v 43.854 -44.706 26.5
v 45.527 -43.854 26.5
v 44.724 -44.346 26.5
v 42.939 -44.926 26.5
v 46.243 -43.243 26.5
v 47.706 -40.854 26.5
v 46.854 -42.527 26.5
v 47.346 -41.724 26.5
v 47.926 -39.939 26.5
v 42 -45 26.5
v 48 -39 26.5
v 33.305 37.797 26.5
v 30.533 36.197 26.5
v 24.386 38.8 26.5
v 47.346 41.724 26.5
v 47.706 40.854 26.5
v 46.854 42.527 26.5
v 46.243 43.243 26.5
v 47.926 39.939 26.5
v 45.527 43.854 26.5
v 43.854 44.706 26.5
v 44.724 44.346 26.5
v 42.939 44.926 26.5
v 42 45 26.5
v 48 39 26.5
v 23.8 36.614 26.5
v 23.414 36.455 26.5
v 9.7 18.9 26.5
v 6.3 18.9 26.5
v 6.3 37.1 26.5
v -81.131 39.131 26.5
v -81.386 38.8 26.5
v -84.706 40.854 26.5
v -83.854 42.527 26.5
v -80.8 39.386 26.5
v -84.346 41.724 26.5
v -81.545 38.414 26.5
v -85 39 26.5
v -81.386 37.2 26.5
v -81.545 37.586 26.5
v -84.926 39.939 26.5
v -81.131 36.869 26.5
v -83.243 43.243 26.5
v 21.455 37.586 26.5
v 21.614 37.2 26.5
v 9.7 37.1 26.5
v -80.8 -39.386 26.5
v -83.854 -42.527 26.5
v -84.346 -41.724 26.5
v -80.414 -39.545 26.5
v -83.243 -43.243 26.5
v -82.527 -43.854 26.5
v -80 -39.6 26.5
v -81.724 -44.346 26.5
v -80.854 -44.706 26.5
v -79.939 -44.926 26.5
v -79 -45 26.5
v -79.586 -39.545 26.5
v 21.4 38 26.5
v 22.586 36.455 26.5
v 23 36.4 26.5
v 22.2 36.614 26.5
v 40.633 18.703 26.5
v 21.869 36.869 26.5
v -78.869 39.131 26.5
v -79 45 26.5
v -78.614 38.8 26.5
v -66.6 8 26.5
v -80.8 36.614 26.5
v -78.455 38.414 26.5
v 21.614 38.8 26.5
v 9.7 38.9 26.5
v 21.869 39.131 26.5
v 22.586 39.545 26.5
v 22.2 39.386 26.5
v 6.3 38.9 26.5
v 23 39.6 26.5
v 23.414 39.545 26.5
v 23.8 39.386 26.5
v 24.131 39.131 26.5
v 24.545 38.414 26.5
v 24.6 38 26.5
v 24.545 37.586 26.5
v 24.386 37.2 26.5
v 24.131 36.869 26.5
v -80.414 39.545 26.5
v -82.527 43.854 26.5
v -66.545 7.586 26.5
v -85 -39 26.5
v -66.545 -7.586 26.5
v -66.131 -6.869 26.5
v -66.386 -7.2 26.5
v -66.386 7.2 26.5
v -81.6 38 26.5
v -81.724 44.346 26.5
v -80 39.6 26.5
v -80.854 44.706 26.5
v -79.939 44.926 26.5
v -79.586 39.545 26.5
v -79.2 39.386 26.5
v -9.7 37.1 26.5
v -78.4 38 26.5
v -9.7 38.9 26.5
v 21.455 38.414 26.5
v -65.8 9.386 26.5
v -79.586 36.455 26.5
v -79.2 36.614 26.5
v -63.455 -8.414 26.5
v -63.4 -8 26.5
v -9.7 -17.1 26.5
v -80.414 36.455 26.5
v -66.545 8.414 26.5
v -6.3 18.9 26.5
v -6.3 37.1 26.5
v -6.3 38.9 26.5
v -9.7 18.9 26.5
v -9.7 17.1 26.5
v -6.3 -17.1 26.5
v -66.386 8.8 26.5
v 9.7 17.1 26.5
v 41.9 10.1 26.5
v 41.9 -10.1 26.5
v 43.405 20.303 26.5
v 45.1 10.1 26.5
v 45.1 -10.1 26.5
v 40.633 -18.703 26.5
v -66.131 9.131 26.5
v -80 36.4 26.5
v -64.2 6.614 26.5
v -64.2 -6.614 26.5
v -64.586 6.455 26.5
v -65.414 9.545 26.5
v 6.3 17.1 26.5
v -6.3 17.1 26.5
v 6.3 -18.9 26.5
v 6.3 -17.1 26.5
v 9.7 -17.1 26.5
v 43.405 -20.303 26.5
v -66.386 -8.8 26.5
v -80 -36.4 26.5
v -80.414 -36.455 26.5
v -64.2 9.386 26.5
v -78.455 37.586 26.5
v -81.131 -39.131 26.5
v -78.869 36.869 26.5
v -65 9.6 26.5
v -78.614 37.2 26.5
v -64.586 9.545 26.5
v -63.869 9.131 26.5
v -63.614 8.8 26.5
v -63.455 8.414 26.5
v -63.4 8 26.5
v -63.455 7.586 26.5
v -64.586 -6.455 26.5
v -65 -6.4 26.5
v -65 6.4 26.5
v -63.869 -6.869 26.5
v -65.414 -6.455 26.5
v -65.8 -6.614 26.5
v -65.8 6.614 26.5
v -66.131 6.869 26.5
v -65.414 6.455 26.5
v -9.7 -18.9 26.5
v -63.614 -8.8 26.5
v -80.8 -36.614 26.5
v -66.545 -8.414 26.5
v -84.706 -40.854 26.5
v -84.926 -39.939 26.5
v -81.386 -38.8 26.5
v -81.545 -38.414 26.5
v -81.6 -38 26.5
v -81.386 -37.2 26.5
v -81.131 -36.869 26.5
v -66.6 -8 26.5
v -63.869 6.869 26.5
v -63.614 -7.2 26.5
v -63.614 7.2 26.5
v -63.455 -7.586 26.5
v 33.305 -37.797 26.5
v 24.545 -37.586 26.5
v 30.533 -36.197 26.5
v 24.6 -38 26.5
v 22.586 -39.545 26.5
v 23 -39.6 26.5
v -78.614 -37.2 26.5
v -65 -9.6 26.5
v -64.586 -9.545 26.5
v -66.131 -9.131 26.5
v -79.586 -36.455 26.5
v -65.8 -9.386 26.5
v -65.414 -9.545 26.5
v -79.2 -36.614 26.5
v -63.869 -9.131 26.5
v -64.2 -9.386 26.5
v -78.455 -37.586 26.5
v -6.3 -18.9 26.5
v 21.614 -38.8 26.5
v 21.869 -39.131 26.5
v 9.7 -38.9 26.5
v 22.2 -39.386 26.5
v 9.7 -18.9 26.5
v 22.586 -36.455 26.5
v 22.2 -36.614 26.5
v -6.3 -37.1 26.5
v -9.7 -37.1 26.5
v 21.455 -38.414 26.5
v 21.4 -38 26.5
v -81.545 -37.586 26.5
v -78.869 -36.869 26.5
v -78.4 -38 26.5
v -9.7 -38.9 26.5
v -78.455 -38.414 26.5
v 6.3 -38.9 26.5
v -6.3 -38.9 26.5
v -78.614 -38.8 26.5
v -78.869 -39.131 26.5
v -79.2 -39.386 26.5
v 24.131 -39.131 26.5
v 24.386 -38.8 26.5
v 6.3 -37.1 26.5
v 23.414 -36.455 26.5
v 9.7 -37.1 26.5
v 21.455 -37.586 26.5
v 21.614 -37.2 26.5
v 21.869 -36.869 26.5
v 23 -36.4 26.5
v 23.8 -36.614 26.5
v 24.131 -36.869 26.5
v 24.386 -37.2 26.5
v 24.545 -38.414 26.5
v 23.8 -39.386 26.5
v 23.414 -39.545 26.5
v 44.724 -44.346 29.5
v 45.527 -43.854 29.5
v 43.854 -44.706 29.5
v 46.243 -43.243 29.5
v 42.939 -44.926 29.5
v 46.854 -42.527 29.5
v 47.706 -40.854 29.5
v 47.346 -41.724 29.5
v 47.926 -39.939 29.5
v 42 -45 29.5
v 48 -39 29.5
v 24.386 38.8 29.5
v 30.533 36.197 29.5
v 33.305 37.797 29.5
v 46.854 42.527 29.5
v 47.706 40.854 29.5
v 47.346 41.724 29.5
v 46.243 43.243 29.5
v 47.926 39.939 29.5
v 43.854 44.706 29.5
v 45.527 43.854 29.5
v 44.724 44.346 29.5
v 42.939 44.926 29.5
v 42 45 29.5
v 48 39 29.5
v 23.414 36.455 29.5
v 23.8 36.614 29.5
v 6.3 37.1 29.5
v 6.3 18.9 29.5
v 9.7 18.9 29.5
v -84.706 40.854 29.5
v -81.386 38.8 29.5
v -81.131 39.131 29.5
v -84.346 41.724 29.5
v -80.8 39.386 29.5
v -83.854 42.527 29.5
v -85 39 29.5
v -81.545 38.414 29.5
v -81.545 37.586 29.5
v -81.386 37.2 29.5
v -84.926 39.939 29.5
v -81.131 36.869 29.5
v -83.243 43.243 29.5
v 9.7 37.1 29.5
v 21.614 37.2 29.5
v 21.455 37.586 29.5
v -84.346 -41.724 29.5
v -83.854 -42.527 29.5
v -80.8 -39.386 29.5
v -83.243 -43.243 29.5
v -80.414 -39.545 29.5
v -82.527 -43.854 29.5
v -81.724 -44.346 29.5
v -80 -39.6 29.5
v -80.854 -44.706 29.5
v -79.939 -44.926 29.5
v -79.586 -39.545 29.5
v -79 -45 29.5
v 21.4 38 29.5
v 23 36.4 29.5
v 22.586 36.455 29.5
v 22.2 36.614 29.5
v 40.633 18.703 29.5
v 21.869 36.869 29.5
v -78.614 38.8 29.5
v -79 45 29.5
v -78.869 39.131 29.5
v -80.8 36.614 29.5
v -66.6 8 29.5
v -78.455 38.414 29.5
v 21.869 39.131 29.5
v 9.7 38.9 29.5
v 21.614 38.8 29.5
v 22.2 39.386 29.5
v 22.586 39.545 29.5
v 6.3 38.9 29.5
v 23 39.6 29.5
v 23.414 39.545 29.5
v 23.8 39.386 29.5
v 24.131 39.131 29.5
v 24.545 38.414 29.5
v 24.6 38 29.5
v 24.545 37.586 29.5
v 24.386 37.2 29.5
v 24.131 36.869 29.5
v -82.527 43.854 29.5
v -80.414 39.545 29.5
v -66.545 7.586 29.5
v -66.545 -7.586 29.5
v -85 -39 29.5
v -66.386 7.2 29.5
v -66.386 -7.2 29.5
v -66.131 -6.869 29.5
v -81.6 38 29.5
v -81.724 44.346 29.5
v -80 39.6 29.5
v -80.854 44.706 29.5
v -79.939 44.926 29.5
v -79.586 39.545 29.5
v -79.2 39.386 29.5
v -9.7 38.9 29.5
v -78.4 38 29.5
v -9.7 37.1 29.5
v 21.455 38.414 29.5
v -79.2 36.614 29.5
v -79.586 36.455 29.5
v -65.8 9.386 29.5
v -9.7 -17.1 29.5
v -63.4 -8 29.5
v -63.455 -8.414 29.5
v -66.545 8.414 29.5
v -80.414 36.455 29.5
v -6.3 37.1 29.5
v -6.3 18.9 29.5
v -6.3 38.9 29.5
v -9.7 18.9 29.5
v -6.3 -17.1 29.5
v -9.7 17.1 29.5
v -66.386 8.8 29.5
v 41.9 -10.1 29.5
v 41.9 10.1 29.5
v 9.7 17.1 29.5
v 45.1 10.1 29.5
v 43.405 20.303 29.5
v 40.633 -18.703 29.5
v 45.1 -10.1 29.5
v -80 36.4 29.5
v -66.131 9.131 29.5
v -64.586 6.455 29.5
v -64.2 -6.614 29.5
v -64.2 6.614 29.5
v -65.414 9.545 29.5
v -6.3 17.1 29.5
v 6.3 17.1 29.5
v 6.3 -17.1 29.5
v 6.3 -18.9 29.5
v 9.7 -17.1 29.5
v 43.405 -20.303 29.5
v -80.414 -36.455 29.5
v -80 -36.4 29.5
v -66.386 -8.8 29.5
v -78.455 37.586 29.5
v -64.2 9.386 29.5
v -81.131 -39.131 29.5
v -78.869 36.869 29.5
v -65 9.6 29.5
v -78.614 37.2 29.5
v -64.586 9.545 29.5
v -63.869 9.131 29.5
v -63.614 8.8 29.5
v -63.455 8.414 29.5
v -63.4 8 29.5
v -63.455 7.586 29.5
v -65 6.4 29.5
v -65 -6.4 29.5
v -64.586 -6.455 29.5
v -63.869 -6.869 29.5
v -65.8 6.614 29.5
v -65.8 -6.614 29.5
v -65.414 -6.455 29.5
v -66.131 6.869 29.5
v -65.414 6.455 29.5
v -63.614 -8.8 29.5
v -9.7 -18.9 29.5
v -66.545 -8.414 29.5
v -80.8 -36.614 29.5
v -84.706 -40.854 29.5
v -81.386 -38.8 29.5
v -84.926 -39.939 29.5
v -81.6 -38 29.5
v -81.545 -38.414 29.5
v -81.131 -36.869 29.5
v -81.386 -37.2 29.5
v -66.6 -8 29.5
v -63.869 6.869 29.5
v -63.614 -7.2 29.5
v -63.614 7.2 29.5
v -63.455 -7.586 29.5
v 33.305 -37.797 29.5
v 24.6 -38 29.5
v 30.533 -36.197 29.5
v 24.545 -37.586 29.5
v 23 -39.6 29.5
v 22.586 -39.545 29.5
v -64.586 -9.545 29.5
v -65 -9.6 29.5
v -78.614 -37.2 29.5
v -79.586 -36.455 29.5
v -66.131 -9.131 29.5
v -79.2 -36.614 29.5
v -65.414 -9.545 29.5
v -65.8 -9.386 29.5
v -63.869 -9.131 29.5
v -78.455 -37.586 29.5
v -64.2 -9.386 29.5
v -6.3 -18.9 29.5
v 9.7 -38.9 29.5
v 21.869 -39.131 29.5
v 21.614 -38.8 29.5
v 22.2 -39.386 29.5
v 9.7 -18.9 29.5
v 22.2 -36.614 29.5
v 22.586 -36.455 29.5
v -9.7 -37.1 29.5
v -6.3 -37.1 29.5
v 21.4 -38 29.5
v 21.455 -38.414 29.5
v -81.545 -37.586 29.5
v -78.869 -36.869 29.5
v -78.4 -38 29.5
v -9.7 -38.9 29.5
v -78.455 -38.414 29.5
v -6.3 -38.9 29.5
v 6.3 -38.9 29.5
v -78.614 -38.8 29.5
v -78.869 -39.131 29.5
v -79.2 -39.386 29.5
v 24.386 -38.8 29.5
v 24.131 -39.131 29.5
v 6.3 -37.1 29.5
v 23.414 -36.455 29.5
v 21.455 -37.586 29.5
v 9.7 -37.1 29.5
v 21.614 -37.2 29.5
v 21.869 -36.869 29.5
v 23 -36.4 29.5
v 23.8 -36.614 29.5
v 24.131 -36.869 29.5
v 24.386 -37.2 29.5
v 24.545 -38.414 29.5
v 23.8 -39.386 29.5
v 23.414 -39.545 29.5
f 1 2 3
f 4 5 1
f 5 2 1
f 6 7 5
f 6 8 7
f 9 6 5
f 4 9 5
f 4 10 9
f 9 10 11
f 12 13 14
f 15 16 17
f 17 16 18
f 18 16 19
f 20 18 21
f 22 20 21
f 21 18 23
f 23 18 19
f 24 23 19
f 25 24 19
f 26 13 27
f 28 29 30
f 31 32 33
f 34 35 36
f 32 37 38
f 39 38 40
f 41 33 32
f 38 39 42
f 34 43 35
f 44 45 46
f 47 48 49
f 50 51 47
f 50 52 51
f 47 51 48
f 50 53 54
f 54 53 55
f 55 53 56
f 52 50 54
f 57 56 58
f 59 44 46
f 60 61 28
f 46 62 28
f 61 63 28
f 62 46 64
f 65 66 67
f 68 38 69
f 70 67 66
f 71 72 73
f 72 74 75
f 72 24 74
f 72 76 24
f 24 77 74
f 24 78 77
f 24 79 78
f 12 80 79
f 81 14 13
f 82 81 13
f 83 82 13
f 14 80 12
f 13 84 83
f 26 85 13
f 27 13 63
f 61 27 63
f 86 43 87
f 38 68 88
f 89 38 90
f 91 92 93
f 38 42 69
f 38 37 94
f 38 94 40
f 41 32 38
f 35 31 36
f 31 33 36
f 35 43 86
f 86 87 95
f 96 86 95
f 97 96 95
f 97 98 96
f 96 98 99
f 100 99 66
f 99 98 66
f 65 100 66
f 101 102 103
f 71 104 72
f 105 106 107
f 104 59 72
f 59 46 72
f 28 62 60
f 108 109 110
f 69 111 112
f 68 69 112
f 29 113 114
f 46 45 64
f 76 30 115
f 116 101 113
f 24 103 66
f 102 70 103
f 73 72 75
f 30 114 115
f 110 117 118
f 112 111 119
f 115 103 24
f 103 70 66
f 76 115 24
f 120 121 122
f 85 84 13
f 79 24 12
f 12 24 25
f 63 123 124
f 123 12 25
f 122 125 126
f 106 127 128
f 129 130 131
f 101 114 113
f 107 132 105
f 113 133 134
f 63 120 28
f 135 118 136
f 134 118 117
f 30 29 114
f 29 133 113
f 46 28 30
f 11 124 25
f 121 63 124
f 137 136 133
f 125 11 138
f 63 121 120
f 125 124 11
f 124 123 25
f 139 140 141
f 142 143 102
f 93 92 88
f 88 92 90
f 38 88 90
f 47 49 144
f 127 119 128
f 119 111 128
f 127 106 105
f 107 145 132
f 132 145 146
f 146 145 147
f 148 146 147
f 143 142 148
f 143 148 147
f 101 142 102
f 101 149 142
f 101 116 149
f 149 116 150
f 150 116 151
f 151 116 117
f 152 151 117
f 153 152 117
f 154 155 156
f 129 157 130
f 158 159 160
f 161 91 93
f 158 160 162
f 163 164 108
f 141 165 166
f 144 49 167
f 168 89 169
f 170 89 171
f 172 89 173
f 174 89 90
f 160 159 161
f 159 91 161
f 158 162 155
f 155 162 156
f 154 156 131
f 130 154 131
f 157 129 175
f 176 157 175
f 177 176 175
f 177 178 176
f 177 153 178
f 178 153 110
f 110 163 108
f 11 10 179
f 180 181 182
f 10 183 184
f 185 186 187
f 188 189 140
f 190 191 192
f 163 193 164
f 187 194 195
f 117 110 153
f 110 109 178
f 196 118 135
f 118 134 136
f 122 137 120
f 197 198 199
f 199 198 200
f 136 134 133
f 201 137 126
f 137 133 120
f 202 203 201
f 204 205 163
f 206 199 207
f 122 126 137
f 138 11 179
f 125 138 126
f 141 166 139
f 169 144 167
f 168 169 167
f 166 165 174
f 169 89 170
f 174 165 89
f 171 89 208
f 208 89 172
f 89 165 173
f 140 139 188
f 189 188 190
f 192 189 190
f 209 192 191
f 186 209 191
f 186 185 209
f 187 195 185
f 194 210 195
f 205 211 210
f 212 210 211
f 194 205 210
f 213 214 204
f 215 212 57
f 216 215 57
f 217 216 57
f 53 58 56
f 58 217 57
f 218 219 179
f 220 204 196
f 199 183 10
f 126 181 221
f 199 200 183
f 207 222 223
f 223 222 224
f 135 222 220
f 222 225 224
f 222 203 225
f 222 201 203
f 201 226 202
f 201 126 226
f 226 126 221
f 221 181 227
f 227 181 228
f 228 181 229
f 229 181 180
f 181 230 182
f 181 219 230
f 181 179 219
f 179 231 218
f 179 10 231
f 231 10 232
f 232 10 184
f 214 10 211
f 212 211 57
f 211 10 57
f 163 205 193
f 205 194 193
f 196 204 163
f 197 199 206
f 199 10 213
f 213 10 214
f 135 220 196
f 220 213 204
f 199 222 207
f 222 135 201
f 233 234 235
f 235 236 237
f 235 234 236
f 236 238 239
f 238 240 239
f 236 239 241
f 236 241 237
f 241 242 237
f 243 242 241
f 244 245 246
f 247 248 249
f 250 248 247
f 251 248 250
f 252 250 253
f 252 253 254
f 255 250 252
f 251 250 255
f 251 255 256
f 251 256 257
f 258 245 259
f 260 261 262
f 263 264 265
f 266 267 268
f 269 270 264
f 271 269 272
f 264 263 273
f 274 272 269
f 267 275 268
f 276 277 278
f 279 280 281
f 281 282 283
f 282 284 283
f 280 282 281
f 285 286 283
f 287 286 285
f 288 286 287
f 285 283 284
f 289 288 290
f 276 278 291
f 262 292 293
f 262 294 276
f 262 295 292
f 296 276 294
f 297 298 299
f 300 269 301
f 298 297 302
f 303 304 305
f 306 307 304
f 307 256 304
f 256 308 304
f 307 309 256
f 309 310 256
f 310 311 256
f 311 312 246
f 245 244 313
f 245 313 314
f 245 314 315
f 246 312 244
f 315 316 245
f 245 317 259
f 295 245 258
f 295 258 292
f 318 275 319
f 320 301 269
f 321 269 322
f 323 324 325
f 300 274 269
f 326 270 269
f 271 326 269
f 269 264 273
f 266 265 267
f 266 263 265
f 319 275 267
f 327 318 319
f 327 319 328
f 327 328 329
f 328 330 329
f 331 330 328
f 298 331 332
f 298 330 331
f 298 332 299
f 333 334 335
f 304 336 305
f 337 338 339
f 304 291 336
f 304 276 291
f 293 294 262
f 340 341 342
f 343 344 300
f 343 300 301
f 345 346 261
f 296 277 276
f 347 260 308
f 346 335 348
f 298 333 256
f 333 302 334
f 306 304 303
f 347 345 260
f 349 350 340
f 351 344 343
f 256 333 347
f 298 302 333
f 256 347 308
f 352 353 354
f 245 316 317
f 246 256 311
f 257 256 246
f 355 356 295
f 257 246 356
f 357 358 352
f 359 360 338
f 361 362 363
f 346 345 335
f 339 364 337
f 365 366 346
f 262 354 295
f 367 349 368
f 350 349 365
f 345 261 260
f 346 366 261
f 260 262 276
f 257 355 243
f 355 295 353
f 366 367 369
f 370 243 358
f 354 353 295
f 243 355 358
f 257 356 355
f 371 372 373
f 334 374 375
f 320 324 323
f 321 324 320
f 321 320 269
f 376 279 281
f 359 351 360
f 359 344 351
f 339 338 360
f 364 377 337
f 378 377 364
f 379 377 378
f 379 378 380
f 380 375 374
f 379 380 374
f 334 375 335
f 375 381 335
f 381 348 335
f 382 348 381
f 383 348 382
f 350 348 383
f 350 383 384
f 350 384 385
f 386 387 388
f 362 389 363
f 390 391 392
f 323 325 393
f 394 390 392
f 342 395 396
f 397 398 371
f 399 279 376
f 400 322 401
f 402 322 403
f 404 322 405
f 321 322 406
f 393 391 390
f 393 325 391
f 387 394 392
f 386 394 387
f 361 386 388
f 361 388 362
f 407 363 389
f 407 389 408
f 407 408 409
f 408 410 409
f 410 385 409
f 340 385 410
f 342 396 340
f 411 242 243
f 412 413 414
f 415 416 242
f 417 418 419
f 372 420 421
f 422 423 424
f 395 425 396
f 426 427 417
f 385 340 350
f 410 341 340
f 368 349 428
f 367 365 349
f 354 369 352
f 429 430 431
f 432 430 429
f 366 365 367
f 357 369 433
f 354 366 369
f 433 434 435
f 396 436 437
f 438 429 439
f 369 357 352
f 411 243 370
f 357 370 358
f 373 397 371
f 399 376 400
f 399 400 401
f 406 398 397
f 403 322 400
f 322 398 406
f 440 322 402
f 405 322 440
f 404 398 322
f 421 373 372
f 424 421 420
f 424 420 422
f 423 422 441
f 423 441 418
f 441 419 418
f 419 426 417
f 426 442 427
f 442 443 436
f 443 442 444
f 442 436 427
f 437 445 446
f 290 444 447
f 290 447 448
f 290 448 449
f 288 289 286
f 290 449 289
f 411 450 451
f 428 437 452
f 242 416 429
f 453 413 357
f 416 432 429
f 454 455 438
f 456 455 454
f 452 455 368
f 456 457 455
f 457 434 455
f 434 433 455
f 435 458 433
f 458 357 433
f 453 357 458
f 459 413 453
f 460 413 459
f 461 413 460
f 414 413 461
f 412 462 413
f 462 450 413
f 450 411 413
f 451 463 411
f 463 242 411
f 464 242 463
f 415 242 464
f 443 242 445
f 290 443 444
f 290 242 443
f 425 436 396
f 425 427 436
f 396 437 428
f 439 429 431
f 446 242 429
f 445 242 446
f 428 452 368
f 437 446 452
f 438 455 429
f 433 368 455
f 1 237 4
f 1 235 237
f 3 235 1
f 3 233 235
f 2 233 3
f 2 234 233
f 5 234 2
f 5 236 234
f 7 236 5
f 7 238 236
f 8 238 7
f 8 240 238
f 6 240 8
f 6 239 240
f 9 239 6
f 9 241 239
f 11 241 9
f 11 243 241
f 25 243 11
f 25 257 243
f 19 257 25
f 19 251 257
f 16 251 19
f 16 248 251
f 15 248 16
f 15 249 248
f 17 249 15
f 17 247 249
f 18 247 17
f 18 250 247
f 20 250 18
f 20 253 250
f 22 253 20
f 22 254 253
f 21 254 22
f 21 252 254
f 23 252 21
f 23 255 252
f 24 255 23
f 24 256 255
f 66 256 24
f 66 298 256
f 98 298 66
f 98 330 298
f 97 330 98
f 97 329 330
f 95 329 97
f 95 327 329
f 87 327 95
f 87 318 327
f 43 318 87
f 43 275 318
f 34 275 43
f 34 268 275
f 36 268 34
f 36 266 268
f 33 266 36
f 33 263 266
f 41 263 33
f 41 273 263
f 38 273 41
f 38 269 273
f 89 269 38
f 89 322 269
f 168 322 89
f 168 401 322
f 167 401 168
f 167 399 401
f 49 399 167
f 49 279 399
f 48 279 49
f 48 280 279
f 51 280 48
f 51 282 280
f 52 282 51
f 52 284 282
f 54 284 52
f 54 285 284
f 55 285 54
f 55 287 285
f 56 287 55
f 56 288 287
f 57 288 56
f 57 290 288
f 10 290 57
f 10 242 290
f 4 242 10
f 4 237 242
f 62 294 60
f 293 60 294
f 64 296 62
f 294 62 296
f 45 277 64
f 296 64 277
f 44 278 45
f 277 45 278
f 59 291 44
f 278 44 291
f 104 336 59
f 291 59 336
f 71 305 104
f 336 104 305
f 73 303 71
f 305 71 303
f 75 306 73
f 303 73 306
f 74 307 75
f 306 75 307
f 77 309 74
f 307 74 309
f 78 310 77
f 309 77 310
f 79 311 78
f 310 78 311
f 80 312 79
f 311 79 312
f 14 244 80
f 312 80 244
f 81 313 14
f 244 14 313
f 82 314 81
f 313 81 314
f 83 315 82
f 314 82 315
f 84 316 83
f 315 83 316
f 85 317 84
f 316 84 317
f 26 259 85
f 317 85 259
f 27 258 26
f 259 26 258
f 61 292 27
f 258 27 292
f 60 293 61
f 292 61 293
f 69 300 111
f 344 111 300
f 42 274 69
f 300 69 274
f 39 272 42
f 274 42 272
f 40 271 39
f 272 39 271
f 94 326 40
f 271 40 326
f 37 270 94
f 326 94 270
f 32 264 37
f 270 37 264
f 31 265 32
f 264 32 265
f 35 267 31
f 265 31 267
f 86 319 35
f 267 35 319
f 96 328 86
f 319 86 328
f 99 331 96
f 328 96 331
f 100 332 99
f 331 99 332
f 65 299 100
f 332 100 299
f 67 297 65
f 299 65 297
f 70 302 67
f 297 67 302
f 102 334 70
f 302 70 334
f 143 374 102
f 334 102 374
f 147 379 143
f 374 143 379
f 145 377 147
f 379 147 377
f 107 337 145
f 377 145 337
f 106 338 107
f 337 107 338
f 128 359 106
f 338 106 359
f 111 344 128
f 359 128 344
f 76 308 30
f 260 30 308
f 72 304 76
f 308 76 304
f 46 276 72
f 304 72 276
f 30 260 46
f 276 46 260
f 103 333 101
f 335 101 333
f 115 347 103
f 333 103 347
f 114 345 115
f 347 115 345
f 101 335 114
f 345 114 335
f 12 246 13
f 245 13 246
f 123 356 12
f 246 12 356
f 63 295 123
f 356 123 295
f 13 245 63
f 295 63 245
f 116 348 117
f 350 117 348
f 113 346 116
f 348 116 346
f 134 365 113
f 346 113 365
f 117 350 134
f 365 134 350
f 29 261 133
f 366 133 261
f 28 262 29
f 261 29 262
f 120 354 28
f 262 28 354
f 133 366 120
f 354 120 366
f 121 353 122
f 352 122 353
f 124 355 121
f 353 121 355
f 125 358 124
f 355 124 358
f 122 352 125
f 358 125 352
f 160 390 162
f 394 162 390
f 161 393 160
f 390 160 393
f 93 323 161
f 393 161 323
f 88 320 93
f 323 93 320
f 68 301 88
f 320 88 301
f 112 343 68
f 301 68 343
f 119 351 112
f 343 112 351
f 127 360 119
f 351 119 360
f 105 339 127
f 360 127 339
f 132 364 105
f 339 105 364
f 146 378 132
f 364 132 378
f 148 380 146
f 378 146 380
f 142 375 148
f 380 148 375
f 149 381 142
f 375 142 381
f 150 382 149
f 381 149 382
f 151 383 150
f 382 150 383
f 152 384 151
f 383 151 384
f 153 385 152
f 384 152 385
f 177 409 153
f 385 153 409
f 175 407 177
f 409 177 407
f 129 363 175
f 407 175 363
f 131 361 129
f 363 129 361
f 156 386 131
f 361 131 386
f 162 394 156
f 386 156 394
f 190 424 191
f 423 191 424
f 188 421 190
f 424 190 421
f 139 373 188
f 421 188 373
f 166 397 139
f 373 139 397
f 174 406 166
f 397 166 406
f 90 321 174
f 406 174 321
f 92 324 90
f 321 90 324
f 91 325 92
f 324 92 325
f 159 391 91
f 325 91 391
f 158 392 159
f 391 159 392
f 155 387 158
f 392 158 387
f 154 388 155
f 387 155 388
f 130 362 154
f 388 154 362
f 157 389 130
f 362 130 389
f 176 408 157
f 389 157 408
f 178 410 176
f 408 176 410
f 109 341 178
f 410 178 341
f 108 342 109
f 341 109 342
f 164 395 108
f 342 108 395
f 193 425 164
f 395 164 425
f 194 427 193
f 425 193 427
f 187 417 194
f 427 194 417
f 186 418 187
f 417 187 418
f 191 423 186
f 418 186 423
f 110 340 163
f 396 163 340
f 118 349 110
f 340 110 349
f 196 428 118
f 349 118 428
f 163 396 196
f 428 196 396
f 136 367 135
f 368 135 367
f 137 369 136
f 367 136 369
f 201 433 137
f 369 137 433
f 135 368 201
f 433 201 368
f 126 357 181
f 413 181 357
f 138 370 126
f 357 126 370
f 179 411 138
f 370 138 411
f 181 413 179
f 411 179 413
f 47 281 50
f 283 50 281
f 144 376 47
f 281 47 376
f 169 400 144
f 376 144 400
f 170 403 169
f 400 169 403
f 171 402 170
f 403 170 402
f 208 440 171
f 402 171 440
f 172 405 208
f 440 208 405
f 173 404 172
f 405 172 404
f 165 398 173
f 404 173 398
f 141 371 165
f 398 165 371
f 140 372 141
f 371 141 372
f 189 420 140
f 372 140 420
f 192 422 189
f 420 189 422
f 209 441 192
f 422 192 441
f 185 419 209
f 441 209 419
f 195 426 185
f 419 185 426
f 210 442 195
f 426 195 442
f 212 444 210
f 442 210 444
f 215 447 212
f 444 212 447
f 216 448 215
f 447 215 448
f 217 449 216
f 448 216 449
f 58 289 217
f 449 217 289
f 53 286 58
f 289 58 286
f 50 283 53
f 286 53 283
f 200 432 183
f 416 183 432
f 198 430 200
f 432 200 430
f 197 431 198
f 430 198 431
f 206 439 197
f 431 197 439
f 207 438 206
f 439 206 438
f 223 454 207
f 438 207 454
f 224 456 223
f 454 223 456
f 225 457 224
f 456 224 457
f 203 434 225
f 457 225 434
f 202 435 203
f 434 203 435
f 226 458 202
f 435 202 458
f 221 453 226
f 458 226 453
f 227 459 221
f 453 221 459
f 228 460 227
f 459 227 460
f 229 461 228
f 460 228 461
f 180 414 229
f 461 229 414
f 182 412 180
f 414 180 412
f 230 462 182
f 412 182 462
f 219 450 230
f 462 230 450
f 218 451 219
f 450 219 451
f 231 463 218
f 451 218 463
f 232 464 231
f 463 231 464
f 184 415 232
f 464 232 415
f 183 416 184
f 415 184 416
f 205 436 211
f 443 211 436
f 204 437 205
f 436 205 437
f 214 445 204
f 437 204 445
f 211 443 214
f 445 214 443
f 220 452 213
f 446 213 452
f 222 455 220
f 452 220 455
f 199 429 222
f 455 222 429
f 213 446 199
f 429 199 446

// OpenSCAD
// file: lib.scad
// Robot 3B modeli ve lazer kesim sekilleri. Veri (diziler) design/design.py'den uretilir: generated/<varyant>.scad
// Kullanim:  openscad -D 'part="plate_top"' -o cikti.stl design/robot_pico.scad
// part: tum parcalarin adi | "plate_bottom_2d" | "plate_bottom_marks" | "plate_top_2d" | "plate_top_marks" | "bracket_2d"
$fn = 40;

module rrect2d(o) {                       // o = [x0, x1, y0, y1, r]
  r = o[4];
  hull() for (x = [o[0] + r, o[1] - r], y = [o[2] + r, o[3] - r]) translate([x, y]) circle(r);
}
module plate2d(o, holes, slots) {
  difference() {
    rrect2d(o);
    for (h = holes) translate([h[0], h[1]]) circle(d = h[2], $fn = 24);
    for (s = slots) translate([s[0], s[1]]) rotate(s[4]) square([s[2], s[3]], center = true);
  }
}
module marks2d(marks) {                   // yerlesim cizgileri (kazima): ince dikdortgen cercevesi
  for (m = marks) difference() {
    translate([m[0], m[1]]) square([m[2] - m[0], m[3] - m[1]]);
    translate([m[0] + 0.3, m[1] + 0.3]) square([m[2] - m[0] - 0.6, m[3] - m[1] - 0.6]);
  }
}
module plate3d(z, o, holes, slots) {
  translate([0, 0, z[0]]) linear_extrude(height = z[1] - z[0]) plate2d(o, holes, slots);
}
module part3d(p) {
  k = p[0];
  if (k == "box") translate([p[2], p[4], p[6]]) cube([p[3] - p[2], p[5] - p[4], p[7] - p[6]]);
  else if (k == "rbox") translate([p[2], p[3], p[6]]) rotate(p[8]) translate([-p[5] / 2, -p[4] / 2, 0]) cube([p[5], p[4], p[7] - p[6]]);
  else if (k == "cylz") translate([p[2], p[3], p[5]]) cylinder(d = p[4], h = p[6] - p[5]);
  // cyly: ["cyly", ad, cx, cz, y0, y1, d]
  else if (k == "cyly") translate([p[2], p[4], p[3]]) rotate([-90, 0, 0]) cylinder(d = p[6], h = p[5] - p[4]);
  else if (k == "sphere") translate([p[2], p[3], p[4]]) sphere(r = p[5]);
}

module render_part(name) {
  if (name == "plate_bottom_2d") plate2d(OUT_B, HOLES_B, SLOTS_B);
  else if (name == "plate_bottom_marks") marks2d(MARKS_B);
  else if (name == "plate_top_2d") plate2d(OUT_T, HOLES_T, SLOTS_T);
  else if (name == "plate_top_marks") marks2d(MARKS_T);
  else if (name == "bracket_2d") square([BRACKET[0], BRACKET[1]]);
  else if (name == "plate_bottom") plate3d(Z_B, OUT_B, HOLES_B, SLOTS_B);
  else if (name == "plate_top") plate3d(Z_T, OUT_T, HOLES_T, SLOTS_T);
  else for (p = PARTS) if (p[1] == name) part3d(p);
}
// file: generated/pi4.scad
// OTOMATIK URETILDI (design/design.py, varyant: pi4); elle degistirme.
OUT_B = [[-85, 48, -45, 45, 6]][0];
HOLES_B = [[23, 38, 3.2], [23, -38, 3.2], [-80, 38, 3.2], [-80, -38, 3.2], [-65, 8, 3.2], [-65, -8, 3.2]];
SLOTS_B = [[-8, 18, 3.4, 1.8, 0], [8, 18, 3.4, 1.8, 0], [-8, 38, 3.4, 1.8, 0], [8, 38, 3.4, 1.8, 0], [-8, -18, 3.4, 1.8, 0], [8, -18, 3.4, 1.8, 0], [-8, -38, 3.4, 1.8, 0], [8, -38, 3.4, 1.8, 0], [36.9689, 28.25, 20.2, 3.2, 120], [43.5, 0, 20.2, 3.2, 90], [36.9689, -28.25, 20.2, 3.2, 60]];
MARKS_B = [[-83, -20, -13, 20], [-8, 12, 12, 32], [-8, -30, 12, -14]];
Z_B = [26.5, 29.5];
OUT_T = [[-85, 28, -45, 45, 6]][0];
HOLES_T = [[23, 38, 3.2], [23, -38, 3.2], [-80, 38, 3.2], [-80, -38, 3.2], [-59, -24.5, 3.05], [-1, -24.5, 3.05], [-59, 24.5, 3.05], [-1, 24.5, 3.05]];
SLOTS_T = [[-76, 0, 6, 14, 0]];
MARKS_T = [];
Z_T = [49.5, 52.5];
BRACKET = [20, 34];
PARTS = [["cylz", "standoff_0", 23, 38, 6, 29.5, 49.5], ["cylz", "standoff_1", 23, -38, 6, 29.5, 49.5], ["cylz", "standoff_2", -80, 38, 6, 29.5, 49.5], ["cylz", "standoff_3", -80, -38, 6, 29.5, 49.5], ["box", "plate_bottom", -85, 48, -45, 45, 26.5, 29.5], ["box", "plate_top", -85, 28, -45, 45, 49.5, 52.5], ["cyly", "wheel_l", 0, 21.5, 48, 67, 43], ["box", "motor_l", -6, 6, 12, 46, 16.5, 26.5], ["cyly", "wheel_r", 0, 21.5, -67, -48, 43], ["box", "motor_r", -6, 6, -46, -12, 16.5, 26.5], ["sphere", "caster_ball", -65, 0, 10.7, 10.7], ["cylz", "caster_spacer_p", -65, 8, 6, 21.4, 26.5], ["cylz", "caster_spacer_n", -65, -8, 6, 21.4, 26.5], ["rbox", "tof_bracket_left", 36.9689, 28.25, 20, 3, 26.5, 60.5, 30], ["rbox", "tof_left", 39.134, 29.5, 13, 2, 42.5, 60.5, 30], ["rbox", "tof_bracket_center", 43.5, 0, 20, 3, 26.5, 60.5, 0], ["rbox", "tof_center", 46, 0, 13, 2, 42.5, 60.5, 0], ["rbox", "tof_bracket_right", 36.9689, -28.25, 20, 3, 26.5, 60.5, -30], ["rbox", "tof_right", 39.134, -29.5, 13, 2, 42.5, 60.5, -30], ["box", "power_placeholder", -83, -13, -20, 20, 29.5, 47.5], ["box", "tb6612", -8, 12, 12, 32, 29.5, 32.5], ["box", "mpu6050", -8, 12, -30, -14, 29.5, 32.5], ["cylz", "pi4_spacer_22", -59, -24.5, 5, 52.5, 57.5], ["cylz", "pi4_spacer_23", -1, -24.5, 5, 52.5, 57.5], ["cylz", "pi4_spacer_24", -59, 24.5, 5, 52.5, 57.5], ["cylz", "pi4_spacer_25", -1, 24.5, 5, 52.5, 57.5], ["box", "pi4", -62.5, 22.5, -28, 28, 57.5, 74.5]];
// main file
// Robot (pi4) 3B modeli. Diziler generated/pi4.scad dosyasindan gelir.
include <generated/pi4.scad>
include <lib.scad>
part = "plate_bottom";
render_part(part);
